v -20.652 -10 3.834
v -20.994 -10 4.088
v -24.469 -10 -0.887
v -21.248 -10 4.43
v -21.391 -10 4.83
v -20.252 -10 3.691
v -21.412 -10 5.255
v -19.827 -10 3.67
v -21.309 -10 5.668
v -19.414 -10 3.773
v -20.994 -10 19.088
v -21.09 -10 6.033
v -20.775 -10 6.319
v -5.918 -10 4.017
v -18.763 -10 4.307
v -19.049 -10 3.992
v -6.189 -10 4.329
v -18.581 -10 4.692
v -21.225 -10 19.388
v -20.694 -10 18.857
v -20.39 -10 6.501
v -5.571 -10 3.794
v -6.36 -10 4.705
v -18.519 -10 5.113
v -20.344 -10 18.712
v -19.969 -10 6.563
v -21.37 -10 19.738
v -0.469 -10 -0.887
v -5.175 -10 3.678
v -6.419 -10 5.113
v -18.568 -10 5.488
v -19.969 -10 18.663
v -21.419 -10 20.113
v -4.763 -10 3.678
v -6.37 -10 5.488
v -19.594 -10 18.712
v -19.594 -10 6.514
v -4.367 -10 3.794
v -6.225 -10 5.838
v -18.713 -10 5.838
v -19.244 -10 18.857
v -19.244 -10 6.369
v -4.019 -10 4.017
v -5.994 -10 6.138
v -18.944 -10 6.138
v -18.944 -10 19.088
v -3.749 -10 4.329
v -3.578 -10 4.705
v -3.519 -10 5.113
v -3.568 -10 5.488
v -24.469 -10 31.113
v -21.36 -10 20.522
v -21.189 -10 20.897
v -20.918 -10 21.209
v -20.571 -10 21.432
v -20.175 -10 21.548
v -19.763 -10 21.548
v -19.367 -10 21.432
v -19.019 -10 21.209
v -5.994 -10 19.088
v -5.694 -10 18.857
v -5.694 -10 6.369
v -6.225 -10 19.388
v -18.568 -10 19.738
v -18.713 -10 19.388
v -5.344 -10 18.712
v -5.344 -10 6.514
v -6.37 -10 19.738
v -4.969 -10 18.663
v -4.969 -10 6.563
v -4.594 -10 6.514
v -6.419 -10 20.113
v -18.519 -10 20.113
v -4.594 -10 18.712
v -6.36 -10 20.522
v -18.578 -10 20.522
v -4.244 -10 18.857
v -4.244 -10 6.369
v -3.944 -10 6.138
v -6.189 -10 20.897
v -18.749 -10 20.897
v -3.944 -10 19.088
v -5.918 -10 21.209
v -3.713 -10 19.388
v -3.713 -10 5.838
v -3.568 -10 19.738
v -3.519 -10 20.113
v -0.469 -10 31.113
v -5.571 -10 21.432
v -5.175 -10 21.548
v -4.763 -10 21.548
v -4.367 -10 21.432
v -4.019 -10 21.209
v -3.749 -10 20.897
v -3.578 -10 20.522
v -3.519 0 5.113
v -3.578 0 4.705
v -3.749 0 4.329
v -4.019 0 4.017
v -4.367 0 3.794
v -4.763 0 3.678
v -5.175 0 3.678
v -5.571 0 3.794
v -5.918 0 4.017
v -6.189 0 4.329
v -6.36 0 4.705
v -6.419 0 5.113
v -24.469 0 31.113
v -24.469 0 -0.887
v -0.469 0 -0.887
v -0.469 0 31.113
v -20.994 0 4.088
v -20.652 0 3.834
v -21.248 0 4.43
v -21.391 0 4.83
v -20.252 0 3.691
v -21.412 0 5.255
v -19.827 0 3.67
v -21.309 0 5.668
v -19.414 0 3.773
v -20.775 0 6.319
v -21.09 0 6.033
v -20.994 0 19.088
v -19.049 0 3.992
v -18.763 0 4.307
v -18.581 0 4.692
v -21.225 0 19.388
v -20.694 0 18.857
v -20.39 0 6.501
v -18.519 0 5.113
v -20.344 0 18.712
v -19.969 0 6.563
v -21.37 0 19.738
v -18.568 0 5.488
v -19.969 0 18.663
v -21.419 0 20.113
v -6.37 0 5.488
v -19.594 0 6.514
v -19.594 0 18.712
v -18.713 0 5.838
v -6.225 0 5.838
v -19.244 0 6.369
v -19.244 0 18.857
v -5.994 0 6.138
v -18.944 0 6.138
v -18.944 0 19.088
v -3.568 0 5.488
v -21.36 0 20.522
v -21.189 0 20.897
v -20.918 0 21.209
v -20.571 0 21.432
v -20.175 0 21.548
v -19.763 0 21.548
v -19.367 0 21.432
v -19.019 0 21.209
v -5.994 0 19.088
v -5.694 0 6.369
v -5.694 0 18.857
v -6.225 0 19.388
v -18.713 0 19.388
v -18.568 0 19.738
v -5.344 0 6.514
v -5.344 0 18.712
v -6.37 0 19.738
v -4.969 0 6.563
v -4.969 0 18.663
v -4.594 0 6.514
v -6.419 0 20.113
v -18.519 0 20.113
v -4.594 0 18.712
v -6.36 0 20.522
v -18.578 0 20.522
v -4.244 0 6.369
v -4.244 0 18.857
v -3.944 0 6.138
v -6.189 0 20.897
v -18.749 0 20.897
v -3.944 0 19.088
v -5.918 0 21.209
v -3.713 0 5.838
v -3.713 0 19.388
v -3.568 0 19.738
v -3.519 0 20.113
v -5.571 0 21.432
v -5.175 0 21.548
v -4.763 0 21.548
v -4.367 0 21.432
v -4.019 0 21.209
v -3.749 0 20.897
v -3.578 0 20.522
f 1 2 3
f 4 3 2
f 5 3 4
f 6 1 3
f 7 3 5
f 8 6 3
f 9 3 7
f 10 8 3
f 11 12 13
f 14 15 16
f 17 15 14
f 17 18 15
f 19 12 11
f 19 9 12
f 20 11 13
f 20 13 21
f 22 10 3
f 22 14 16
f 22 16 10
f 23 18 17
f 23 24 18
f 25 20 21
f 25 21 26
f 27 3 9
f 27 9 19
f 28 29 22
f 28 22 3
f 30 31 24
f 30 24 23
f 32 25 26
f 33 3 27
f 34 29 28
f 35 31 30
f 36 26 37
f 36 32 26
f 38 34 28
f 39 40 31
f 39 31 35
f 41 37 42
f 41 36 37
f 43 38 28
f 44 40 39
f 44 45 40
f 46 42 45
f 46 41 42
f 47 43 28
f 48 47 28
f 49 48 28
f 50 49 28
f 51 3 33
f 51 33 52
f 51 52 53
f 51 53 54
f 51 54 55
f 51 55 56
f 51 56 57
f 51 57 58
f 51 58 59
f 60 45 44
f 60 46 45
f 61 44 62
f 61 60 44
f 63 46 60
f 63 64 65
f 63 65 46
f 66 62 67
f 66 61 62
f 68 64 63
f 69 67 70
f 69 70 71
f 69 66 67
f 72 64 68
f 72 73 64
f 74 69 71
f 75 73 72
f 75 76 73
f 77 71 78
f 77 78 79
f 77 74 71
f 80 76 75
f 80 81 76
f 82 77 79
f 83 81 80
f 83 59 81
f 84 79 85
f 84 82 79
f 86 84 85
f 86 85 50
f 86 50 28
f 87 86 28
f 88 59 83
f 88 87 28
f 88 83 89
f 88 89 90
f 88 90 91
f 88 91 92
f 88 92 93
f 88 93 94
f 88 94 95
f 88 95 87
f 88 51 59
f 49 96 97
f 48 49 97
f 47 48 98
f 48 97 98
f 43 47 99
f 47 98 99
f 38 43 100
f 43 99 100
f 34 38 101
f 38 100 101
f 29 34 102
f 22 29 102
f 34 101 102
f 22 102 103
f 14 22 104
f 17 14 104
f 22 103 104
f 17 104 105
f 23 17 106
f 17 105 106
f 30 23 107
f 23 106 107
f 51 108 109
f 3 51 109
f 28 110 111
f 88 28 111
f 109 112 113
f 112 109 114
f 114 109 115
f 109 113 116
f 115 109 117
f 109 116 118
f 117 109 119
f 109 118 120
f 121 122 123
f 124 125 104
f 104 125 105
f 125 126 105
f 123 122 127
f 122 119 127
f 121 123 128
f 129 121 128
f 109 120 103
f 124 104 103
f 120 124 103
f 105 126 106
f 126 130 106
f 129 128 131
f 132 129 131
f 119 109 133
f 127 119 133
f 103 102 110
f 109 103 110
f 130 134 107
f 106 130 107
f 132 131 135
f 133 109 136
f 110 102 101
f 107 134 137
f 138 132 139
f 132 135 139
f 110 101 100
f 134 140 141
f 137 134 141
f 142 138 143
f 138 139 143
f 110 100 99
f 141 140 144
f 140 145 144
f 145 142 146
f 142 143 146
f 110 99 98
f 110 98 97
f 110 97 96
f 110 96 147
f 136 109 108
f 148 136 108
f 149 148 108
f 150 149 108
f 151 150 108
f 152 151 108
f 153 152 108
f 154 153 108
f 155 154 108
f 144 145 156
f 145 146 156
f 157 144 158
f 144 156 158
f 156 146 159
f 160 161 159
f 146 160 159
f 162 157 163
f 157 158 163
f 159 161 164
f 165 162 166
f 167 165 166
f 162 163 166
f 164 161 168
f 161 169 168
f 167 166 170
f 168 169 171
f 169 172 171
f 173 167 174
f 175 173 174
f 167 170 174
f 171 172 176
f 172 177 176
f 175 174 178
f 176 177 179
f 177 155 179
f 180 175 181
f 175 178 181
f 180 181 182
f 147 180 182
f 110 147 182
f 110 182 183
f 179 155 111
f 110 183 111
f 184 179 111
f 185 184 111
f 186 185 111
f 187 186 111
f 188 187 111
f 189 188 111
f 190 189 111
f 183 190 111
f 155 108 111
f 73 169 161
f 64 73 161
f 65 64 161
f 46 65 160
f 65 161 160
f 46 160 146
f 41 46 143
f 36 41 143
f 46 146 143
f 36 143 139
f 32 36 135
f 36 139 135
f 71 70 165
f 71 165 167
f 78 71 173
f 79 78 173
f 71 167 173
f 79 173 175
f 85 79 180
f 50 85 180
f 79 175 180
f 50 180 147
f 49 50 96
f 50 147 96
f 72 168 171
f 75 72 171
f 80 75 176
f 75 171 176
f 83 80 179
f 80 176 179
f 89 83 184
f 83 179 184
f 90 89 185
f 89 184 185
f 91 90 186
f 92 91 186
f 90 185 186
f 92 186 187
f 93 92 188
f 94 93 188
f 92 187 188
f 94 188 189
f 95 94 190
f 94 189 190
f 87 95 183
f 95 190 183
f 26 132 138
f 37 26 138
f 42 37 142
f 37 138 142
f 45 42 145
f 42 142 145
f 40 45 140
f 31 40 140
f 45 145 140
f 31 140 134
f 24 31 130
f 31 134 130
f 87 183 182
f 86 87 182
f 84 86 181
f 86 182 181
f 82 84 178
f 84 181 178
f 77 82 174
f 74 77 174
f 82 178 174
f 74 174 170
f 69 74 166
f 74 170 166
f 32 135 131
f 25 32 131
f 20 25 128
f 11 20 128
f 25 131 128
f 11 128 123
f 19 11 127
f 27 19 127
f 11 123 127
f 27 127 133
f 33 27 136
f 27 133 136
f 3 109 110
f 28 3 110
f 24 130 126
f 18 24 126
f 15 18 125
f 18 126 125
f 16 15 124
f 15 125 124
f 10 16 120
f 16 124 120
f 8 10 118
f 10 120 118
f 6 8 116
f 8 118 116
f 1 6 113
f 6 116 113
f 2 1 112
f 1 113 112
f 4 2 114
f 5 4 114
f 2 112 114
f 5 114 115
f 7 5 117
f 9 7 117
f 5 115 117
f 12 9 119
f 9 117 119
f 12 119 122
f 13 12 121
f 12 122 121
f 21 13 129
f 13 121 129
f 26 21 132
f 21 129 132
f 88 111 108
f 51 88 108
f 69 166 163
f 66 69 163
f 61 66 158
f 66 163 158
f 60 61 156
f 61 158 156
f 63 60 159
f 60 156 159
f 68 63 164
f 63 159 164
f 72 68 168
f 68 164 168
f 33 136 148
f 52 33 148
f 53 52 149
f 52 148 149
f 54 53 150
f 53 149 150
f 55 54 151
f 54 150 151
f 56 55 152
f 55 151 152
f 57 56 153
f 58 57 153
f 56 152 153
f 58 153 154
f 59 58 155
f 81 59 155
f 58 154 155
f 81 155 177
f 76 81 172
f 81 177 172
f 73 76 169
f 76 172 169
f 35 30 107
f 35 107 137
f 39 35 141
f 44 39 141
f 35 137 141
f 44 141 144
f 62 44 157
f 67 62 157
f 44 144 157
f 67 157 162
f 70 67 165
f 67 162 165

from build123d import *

# Parameters (mm, degrees)
F1_DEPTH = 10


# Not quite as in the source:
# - a feature names something its author has since deleted; it is built from what else it names


with BuildPart() as f1:
    # F0 (on Front) → F1 (new body)
    with BuildSketch(Plane.XZ):
        with BuildLine():
            Line((-0.4689496755, 31.1130427234), (-12.4689496755, 31.1130427234))
            Line((-12.4689496755, 31.1130427234), (-12.4689496755, 20.1130427234))
            Line((-12.4689496755, 20.1130427234), (-6.4189496755, 20.1130427234))
            ThreePointArc((-6.4189496755, 20.1130427234), (-4.9689496755, 21.5630427234), (-3.5189496755, 20.1130427234))
            ThreePointArc((-3.5189496755, 20.1130427234), (-3.9436448428, 19.0877378907), (-4.9689496755, 18.6630427234))
            Line((-4.9689496755, 18.6630427234), (-4.9689496755, 13.4656252339))
            Line((-4.9689496755, 13.4656252339), (-0.4689496755, 13.4656252339))
            Line((-0.4689496755, 13.4656252339), (-0.4689496755, 31.1130427234))
        make_face()
        with BuildLine():
            Line((-12.4689496755, 31.1130427234), (-24.4689496755, 31.1130427234))
            Line((-24.4689496755, 31.1130427234), (-24.4689496755, 20.1130427234))
            Line((-24.4689496755, 20.1130427234), (-21.4189496755, 20.1130427234))
            ThreePointArc((-21.4189496755, 20.1130427234), (-19.9689496755, 21.5630427234), (-18.5189496755, 20.1130427234))
            Line((-18.5189496755, 20.1130427234), (-12.4689496755, 20.1130427234))
            Line((-12.4689496755, 20.1130427234), (-12.4689496755, 31.1130427234))
        make_face()
        with BuildLine():
            Line((-6.4189496755, 20.1130427234), (-12.4689496755, 20.1130427234))
            Line((-12.4689496755, 20.1130427234), (-18.5189496755, 20.1130427234))
            ThreePointArc((-18.5189496755, 20.1130427234), (-18.9436448428, 19.0877378907), (-19.9689496755, 18.6630427234))
            Line((-19.9689496755, 18.6630427234), (-19.9689496755, 6.5630427234))
            ThreePointArc((-19.9689496755, 6.5630427234), (-18.9436448428, 6.1383475561), (-18.5189496755, 5.1130427234))
            Line((-18.5189496755, 5.1130427234), (-6.4189496755, 5.1130427234))
            ThreePointArc((-6.4189496755, 5.1130427234), (-5.9942545082, 6.1383475561), (-4.9689496755, 6.5630427234))
            Line((-4.9689496755, 6.5630427234), (-4.9689496755, 13.4656252339))
            Line((-4.9689496755, 13.4656252339), (-4.9689496755, 18.6630427234))
            ThreePointArc((-4.9689496755, 18.6630427234), (-5.9942545082, 19.0877378907), (-6.4189496755, 20.1130427234))
        make_face()
        with BuildLine():
            Line((-21.4189496755, 20.1130427234), (-24.4689496755, 20.1130427234))
            Line((-24.4689496755, 20.1130427234), (-24.4689496755, -0.8869572766))
            Line((-24.4689496755, -0.8869572766), (-0.4689496755, -0.8869572766))
            Line((-0.4689496755, -0.8869572766), (-0.4689496755, 13.4656252339))
            Line((-0.4689496755, 13.4656252339), (-4.9689496755, 13.4656252339))
            Line((-4.9689496755, 13.4656252339), (-4.9689496755, 6.5630427234))
            ThreePointArc((-4.9689496755, 6.5630427234), (-3.9436448428, 6.1383475561), (-3.5189496755, 5.1130427234))
            ThreePointArc((-3.5189496755, 5.1130427234), (-4.9689496755, 3.6630427234), (-6.4189496755, 5.1130427234))
            Line((-6.4189496755, 5.1130427234), (-18.5189496755, 5.1130427234))
            ThreePointArc((-18.5189496755, 5.1130427234), (-20.9942545082, 4.0877378907), (-19.9689496755, 6.5630427234))
            Line((-19.9689496755, 6.5630427234), (-19.9689496755, 18.6630427234))
            ThreePointArc((-19.9689496755, 18.6630427234), (-20.9942545082, 19.0877378907), (-21.4189496755, 20.1130427234))
        make_face()
    extrude(amount=F1_DEPTH)


solid = f1.part
